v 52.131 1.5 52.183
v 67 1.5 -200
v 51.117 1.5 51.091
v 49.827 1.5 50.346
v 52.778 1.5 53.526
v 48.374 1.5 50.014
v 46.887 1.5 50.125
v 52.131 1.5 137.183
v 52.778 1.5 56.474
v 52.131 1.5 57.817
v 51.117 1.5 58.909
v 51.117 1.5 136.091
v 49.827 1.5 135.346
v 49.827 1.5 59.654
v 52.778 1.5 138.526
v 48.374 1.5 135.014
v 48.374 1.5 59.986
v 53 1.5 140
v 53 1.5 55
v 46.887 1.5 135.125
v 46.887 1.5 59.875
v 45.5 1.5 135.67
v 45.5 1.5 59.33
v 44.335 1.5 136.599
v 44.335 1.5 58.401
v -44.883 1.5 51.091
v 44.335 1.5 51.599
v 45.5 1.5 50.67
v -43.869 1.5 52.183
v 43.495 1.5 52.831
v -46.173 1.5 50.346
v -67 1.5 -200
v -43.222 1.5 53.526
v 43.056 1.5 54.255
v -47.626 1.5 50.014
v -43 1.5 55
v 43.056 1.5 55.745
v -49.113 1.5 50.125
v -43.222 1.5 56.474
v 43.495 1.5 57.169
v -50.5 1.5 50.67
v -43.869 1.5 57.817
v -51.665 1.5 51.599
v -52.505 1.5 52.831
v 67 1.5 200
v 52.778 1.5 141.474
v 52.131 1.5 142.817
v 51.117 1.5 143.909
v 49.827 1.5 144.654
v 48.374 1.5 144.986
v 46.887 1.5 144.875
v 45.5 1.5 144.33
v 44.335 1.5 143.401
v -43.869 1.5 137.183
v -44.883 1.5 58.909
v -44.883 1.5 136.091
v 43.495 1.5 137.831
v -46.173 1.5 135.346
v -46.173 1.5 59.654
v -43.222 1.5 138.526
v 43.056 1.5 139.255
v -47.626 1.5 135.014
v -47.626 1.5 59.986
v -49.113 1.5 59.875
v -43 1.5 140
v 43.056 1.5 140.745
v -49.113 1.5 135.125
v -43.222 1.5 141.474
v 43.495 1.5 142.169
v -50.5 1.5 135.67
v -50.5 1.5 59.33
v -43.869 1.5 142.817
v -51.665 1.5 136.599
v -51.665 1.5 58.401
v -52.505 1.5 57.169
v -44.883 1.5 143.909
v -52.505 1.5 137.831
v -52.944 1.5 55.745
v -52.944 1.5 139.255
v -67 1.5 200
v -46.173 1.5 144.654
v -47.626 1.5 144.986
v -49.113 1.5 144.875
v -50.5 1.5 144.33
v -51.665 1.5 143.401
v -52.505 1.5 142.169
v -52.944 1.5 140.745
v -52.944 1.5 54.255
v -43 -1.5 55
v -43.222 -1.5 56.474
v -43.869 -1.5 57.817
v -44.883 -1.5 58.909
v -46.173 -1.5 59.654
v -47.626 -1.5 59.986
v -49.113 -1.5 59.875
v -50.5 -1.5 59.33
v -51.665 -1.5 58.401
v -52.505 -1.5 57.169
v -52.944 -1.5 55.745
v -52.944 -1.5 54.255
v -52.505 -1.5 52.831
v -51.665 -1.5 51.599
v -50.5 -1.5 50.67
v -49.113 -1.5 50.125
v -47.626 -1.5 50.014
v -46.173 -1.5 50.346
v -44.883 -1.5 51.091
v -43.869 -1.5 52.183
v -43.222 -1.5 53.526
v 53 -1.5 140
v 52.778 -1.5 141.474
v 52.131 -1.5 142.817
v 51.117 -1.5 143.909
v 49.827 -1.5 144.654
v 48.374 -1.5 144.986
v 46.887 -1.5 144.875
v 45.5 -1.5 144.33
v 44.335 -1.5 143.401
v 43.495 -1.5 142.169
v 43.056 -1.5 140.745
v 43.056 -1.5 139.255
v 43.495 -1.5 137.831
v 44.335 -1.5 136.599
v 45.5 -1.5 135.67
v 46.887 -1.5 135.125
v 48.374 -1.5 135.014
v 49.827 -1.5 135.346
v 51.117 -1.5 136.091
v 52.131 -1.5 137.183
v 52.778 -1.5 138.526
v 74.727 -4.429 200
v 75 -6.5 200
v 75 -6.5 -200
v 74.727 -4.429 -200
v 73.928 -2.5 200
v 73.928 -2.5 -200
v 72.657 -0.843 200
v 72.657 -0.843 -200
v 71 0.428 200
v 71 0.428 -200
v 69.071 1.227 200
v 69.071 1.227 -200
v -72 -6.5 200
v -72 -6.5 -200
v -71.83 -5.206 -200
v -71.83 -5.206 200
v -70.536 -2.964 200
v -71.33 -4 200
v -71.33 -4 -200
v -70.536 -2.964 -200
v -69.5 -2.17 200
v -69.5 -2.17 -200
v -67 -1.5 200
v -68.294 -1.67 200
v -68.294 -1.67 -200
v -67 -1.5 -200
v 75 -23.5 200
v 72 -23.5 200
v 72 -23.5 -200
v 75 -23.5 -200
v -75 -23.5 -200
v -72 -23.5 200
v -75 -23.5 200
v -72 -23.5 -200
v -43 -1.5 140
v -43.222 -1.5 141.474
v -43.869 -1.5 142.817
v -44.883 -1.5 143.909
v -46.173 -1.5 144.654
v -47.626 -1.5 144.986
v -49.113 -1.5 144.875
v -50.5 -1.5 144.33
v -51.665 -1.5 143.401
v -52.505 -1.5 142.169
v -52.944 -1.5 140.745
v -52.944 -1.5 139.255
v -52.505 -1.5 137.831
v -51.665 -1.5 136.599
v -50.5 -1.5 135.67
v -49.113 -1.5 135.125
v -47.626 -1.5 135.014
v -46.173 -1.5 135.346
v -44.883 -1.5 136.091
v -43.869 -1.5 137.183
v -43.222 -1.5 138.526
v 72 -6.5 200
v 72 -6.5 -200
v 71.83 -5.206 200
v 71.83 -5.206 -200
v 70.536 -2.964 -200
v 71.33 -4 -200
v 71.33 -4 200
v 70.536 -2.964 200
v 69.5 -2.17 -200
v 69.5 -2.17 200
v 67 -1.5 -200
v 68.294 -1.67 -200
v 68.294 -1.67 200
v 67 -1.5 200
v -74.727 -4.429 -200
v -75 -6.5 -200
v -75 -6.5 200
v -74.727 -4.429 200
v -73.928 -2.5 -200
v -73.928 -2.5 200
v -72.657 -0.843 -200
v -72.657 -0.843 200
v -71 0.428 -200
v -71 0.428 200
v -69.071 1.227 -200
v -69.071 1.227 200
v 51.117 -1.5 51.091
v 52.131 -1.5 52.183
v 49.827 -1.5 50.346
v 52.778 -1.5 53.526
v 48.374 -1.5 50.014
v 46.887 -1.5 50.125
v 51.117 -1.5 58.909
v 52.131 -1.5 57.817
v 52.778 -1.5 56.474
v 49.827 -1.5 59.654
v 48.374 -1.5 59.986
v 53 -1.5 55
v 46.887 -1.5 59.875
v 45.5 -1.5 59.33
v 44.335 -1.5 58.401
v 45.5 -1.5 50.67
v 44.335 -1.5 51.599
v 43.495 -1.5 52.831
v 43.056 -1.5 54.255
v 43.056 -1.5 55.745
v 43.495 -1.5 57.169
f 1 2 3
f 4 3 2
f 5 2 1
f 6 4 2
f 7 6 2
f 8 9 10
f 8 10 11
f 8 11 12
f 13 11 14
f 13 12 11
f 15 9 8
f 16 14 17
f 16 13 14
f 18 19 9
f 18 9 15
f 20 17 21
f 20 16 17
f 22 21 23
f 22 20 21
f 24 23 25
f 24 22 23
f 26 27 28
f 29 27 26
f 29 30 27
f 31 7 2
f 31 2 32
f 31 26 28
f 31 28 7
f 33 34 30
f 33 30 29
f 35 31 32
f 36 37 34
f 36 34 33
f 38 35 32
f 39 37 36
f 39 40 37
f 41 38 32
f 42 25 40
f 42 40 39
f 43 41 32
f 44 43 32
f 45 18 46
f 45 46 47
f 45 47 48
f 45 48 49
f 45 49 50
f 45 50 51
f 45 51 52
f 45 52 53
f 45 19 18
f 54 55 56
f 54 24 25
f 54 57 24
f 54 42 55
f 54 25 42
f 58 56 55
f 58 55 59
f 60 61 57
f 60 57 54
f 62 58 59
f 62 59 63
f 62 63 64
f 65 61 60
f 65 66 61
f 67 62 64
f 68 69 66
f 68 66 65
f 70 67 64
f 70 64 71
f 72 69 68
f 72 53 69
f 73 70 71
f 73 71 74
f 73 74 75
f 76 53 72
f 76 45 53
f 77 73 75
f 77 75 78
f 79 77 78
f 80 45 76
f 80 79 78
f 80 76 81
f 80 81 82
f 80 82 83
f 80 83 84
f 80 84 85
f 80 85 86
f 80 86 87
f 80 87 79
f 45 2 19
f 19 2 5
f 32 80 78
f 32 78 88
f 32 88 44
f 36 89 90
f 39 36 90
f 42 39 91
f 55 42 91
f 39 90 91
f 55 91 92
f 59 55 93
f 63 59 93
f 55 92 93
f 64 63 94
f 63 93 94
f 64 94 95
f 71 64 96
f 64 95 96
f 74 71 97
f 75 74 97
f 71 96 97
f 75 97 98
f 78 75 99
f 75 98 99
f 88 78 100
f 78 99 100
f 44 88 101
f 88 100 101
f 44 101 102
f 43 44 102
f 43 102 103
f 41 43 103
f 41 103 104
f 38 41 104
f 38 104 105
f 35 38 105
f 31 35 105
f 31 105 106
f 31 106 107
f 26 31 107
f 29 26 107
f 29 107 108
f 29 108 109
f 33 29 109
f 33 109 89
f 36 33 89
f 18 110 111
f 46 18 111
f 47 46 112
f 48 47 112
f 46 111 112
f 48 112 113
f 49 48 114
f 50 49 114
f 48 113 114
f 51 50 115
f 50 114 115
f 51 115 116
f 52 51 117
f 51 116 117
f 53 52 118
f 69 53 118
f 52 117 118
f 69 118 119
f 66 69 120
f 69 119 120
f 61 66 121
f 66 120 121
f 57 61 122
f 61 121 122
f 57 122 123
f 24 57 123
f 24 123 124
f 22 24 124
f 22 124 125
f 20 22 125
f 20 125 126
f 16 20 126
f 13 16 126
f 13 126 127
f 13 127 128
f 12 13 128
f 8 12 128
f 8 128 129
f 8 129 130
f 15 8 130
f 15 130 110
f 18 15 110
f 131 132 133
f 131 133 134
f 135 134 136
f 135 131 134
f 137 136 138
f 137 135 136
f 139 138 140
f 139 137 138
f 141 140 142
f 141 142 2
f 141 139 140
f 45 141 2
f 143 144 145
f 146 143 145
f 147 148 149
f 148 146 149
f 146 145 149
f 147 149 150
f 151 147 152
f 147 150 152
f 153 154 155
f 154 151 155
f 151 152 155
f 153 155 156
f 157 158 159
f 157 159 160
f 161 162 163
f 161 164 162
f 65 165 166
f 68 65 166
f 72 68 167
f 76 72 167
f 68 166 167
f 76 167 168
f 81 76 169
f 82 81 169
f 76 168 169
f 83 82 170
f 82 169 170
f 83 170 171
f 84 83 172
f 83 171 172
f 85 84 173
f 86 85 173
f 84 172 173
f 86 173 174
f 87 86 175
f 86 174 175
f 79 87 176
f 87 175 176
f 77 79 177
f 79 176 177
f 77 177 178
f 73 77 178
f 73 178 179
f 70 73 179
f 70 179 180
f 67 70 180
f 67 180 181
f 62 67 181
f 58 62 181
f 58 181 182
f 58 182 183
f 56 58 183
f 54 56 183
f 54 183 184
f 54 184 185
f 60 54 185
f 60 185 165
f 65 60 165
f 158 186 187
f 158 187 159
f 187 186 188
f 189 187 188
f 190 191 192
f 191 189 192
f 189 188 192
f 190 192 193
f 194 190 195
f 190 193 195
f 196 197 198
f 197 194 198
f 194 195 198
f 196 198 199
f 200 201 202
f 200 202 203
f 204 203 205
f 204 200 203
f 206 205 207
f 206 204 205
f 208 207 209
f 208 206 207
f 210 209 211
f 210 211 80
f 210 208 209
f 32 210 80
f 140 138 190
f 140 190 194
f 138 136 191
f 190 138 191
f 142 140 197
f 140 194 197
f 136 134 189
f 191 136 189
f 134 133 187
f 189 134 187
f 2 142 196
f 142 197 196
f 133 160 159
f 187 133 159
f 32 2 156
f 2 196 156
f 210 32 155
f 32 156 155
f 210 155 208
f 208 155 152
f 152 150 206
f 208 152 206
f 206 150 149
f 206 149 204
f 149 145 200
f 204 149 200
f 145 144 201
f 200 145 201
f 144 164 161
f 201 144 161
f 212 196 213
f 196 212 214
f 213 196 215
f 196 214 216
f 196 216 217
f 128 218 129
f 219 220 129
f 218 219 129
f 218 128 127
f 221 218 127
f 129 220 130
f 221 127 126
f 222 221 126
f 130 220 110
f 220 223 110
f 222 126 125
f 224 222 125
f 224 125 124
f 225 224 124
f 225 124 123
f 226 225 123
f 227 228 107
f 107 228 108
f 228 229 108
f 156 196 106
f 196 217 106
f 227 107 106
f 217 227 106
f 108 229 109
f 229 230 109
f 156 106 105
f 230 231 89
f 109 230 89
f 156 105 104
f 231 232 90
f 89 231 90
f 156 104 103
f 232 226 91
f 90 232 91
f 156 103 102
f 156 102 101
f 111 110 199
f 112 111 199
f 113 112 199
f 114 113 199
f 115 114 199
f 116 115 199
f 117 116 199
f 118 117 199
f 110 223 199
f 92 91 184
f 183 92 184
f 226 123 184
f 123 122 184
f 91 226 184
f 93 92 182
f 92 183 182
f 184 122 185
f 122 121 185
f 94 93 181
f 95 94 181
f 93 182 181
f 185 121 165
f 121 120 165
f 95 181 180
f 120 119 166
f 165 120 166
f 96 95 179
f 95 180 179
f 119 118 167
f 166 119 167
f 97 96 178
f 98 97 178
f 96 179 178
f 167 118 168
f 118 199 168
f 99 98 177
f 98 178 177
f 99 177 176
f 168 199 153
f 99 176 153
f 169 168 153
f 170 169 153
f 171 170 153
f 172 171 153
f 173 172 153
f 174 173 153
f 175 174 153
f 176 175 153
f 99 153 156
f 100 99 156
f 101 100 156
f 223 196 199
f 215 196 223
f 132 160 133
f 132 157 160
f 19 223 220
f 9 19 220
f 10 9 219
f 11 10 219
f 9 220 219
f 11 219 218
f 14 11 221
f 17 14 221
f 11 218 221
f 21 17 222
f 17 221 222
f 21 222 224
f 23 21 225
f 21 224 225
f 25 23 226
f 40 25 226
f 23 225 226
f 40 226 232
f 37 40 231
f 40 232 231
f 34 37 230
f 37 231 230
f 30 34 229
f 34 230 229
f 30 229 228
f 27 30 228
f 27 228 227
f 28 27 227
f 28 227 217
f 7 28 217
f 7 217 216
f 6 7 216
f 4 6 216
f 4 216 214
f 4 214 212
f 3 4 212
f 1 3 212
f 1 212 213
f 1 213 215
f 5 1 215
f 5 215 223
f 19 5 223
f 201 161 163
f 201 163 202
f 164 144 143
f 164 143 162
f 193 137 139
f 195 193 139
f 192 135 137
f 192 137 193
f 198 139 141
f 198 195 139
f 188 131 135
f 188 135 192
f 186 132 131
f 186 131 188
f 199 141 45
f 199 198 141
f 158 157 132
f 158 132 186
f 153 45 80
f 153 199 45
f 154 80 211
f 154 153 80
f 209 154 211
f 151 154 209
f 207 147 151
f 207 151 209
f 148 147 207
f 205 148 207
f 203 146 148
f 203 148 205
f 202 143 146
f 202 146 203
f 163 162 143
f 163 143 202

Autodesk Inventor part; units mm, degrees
ref_plane "YZ Plane" through (0, 0, 0) normal (1, 0, 0) x (0, 1, 0)
ref_plane "XZ Plane" through (0, 0, 0) normal (0, 1, 0) x (-1, 0, 0)
ref_plane "XY Plane" through (0, 0, 0) normal (0, 0, 1) x (1, 0, 0)
sketch "Sketch4" plane through (0, 0, 0) normal (0, 1, 0) x (-1, 0, 0)
  line L0 (75, -200) -> (-75, -200)
  line L1 (-75, -200) -> (-75, 200)
  line L2 (-75, 200) -> (75, 200)
  line L3 (75, 200) -> (75, -200)
  line L4 (75, -200) -> (-75, 200) construction
  point P0 (0, 0)
  point P1 (0, 0)
  dimension "d24" = 150
  dimension "d25" = 400
extrude "Plate4" add sketch "Sketch4" along normal mid plane 3
sketch "Sketch7" plane through (0, -1.5, 0) normal (0, -1, 0) x (1, 0, 0)
  circle A0 centre (48, 55) radius 5
  line L0 (75, 200) -> (75, -200) projected
  line L1 (75, -200) -> (-75, -200) projected
  line L2 (0, -200) -> (0, 200) construction
  line L3 (75, 0) -> (-75, 0) construction
  circle A1 centre (-48, 55) radius 5
  circle A2 centre (48, 140) radius 5
  circle A3 centre (-48, 140) radius 5
  line L4 (75, 200) -> (-75, 200) projected
  point P0 (0, 0)
  point P1 (0, 0)
  dimension "d41" = 10
  dimension "d46" = 85
  dimension "d57" = 96
  dimension "d70" = 145
extrude "Extrusion2" cut sketch "Sketch7" against normal up to surface (3 mm away)
sketch "Sketch9" plane through (72, 1.5, -200) normal (1, 0, 0) x (0, -1, 0)
  line L0 (0, 400) -> (0, 0)
  line L1 (0, 0) -> (25, 0)
  line L2 (25, 0) -> (25, 400)
  line L3 (25, 400) -> (0, 400)
edge flange "Flange5" height 25 angle 90 thickness 3 bend radius 5 thickness toward (1, 0, 0) relief round relief width 3 relief depth 1.5 corner gap 5 corner form 0 edges at (75, 1.5, 0) (-75, 1.5, 0) wall of the first edge with corners at (72, 1.5, 200) (72, 1.5, -200) (72, -23.5, -200) (72, -23.5, 200)
bend "Bend5"
corner "Corner5"
sketch "Sketch12" plane through (0, 1.5, 0) normal (0, 1, 0) x (1, 0, 0)
  line L0 (-67, 200) -> (-67, -200) projected
  line L1 (67, -200) -> (-67, -200) projected
  line L2 (-56.875, -200) -> (-56.875, -81.7006) construction
  line L3 (-67, -150) -> (-26.2093, -150) construction
  circle A0 centre (-56.875, -150) radius 3
  point P0 (0, 0)
  dimension "d86" = 10.125
  dimension "d87" = 50
  dimension "d88" = 6
extrude "Extrusion5" [suppressed]
pattern_linear "Rectangular Pattern2" [suppressed]
equation "\"d25\" = Длина_базовой_пластины"
equation "\"d26\" = Thickness"
equation "\"d60\" = BendReliefWidth"
equation "\"d61\" = BendReliefDepth"
equation "\"d62\" = MinimumRemnant"
equation "\"d63\" = TransitionRadius"
equation "\"d66\" = BendRadius"
equation "\"d67\" = CornerReliefSize"
equation "\"d68\" = GapSize"
equation "\"d69\" = JacobiRadiusSize"
equation "\"BendReliefWidth\" = Thickness"
equation "\"BendReliefDepth\" = 0.5 * Thickness"
equation "\"CornerReliefSize\" = 4 * Thickness"
equation "\"MinimumRemnant\" = 2 * Thickness"
equation "\"TransitionRadius\" = BendRadius"
equation "\"JacobiRadiusSize\" = BendRadius"
equation "\"GapSize\" = Thickness"
equation "\"Длина_базовой_пластины\" = 400"
equation "\"Thickness\" = 3"
equation "\"BendRadius\" = 5"
properties part number "base plate 1" material "Stainless Steel"
